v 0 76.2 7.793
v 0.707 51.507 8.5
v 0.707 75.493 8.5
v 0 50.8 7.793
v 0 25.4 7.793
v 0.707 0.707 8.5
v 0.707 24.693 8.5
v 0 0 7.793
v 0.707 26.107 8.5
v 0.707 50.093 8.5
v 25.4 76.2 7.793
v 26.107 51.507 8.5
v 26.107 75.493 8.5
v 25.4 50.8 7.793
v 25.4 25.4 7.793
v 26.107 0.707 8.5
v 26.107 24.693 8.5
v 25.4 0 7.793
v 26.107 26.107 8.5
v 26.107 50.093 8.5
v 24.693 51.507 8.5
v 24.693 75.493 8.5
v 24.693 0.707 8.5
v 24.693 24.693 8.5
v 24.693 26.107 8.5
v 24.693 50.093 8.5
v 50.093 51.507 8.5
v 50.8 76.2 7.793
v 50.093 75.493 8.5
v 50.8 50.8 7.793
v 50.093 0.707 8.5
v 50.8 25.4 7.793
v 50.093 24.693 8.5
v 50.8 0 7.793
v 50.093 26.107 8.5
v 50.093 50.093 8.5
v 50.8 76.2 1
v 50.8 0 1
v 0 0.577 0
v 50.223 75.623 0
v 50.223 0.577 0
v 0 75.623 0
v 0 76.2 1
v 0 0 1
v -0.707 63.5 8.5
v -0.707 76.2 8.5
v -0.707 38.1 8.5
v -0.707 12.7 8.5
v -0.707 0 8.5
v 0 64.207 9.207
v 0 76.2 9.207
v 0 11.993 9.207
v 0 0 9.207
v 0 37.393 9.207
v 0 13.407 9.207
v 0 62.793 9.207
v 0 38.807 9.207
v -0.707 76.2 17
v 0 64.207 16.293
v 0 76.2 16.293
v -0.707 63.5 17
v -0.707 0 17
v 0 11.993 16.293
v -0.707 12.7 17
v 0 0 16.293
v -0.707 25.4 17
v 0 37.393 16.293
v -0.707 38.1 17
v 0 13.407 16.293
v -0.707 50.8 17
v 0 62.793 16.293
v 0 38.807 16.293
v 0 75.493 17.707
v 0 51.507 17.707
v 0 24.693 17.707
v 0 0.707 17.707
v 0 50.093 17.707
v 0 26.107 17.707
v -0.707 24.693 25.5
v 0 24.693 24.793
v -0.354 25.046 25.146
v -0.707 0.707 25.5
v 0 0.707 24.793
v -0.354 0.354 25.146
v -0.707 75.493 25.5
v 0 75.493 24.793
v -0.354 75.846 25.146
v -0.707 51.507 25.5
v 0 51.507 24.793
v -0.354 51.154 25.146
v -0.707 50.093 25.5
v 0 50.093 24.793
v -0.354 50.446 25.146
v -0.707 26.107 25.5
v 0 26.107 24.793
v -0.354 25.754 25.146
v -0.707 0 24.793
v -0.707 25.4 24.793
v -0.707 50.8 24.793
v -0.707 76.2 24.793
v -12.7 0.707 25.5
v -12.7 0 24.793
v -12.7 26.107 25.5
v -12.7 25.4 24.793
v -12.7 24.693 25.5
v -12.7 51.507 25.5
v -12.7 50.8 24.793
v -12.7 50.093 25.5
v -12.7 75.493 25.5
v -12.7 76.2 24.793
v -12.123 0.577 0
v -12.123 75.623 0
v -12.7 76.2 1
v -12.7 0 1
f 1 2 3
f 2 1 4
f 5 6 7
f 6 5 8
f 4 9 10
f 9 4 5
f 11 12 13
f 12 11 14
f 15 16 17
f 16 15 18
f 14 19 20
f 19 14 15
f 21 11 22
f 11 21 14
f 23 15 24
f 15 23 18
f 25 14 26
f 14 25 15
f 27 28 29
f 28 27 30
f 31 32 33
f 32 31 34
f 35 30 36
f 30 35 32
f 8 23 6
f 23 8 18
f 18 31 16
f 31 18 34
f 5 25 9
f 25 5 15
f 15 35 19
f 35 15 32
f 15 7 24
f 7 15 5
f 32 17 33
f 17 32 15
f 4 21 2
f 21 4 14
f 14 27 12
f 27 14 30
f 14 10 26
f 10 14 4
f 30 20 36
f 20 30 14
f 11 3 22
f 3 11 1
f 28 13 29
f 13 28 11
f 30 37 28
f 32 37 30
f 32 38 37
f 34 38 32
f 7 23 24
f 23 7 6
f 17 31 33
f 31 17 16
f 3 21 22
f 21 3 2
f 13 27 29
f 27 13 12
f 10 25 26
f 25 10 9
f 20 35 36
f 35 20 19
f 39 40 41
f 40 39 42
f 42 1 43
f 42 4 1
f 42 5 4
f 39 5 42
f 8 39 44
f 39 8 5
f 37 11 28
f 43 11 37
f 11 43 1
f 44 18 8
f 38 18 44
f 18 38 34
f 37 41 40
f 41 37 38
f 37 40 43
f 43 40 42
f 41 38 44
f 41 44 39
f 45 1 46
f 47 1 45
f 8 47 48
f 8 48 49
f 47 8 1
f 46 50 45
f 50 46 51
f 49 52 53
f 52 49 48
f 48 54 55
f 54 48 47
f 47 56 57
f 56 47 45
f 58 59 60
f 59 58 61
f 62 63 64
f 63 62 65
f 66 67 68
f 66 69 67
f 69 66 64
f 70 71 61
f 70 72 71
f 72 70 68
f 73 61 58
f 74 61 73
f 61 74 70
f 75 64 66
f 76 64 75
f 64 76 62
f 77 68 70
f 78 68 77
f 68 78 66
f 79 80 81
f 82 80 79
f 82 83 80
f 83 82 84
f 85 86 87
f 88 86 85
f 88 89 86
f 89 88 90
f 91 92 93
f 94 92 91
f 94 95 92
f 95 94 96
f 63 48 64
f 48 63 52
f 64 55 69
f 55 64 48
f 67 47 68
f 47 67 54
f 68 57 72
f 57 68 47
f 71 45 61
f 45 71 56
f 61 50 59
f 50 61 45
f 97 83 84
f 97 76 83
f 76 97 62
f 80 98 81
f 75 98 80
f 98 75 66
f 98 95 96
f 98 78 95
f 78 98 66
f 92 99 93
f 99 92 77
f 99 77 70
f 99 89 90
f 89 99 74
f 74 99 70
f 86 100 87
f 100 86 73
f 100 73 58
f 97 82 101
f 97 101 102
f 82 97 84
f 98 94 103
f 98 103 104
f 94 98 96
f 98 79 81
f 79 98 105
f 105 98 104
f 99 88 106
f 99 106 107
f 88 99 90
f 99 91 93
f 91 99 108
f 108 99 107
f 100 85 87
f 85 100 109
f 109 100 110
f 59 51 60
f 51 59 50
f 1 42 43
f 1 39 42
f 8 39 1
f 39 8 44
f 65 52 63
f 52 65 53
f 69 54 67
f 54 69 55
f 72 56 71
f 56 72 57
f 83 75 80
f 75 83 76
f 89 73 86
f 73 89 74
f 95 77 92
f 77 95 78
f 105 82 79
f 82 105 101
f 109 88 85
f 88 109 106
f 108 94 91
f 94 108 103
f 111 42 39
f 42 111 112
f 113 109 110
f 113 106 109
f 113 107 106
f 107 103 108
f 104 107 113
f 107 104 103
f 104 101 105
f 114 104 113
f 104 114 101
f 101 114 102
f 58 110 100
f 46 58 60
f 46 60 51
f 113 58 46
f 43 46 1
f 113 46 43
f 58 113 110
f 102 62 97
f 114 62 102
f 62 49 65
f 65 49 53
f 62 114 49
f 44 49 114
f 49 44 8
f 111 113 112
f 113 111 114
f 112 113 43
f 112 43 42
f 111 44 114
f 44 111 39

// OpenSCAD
thickness=8.5;
tilex=2;
tiley=3;
inch=25.4;
groove=1;

//floor
difference()
{
    
    translate([tilex*inch/2,tiley*inch/2,thickness/2])cube([tilex*inch,tiley*inch,thickness],center=true);
    pocks=floor(rands(0,(tilex*tiley)*.75,1)[0]);
    echo (pocks);
    for (ii=[0:pocks])
    {
        shapenum = floor(rands(0,16,1)[0])+1;
        angle=floor(rands(0,360,1)[0])+1;
        xx=inch*(rands(0,tilex,1)[0])+inch/2;
        yy=inch*(rands(0,tiley,1)[0])+inch/2;
        translate([xx,yy,0])rotate([0,0,angle])translate([0,0,thickness])blemish(shapenum);
    }
    for (ii=[0:tilex])
    {
        translate([ii*inch,tiley*inch/2,thickness])rotate([0,45,0])cube([groove,tiley*inch*2,groove],center=true);
    }
    for (ii=[0:tiley])
    {
        translate([tilex*inch/2,ii*inch,thickness])rotate([45,0,0])cube([tilex*inch*2,groove,groove],center=true);
    }
    translate([tilex*inch,tiley*inch/2,0])rotate([0,30,0])cube([groove,tiley*inch*2,groove*2],center=true);
    //translate([0,tiley*inch/2,0])rotate([0,60,0])cube([groove*2,tiley*inch*2,groove],center=true);
    translate([tilex*inch/2,tiley*inch,0])rotate([60,0,0])cube([tilex*inch*2,groove*2,groove],center=true);
    translate([tilex*inch/2,0,0])rotate([30,0,0])cube([tilex*inch*2,groove,groove*2],center=true);
}
//wall
translate([-inch/2,0,0])
difference()
{
    translate([inch/4,tiley*inch/2,thickness*1.5])cube([inch/2,tiley*inch,thickness*3],center=true);
    
    pocks=floor(rands(0,(tiley)*.75,1)[0]);
    //pocks=0;
    //echo (pocks);
    for (ii=[0:pocks])
    {
        shapenum = floor(rands(0,16,1)[0])+1;
        echo(shapenum);
        angle=floor(rands(0,360,1)[0])+1;
        xx=((thickness*2+inch/2))*(rands(0,1,1)[0]); //total area is the top (inch/2) and the wall (2 thicknesses)
        yy=inch*(rands(0,tiley,1)[0]);
        zz=(inch/2+thickness*3)-xx;  //pivot is going to be the total area, minus how far we've gone so far (xx)
        
        translate([xx,yy,thickness*3])rotate([0,0,angle])blemish(shapenum);
        translate([inch/2,yy,zz])rotate([0,90,0])rotate([0,0,angle])blemish(shapenum);
    }
    for (ii=[0:2])
    {
        translate([inch/2,tiley*inch/2,thickness*1+(ii*thickness)])rotate([0,45,0])cube([groove,tiley*inch*2,groove],center=true);
    }
    for (ii=[0:tiley])
    {
        translate([inch/2,inch*ii+inch/2,thickness+thickness*.5])rotate([0,0,45])cube([groove,groove,thickness],center=true);
    }
    for (ii=[0:tiley])
    {
        translate([inch/2,inch*ii,thickness*2+thickness*.5])rotate([0,0,45])cube([groove,groove,thickness],center=true);
    }
    for (ii=[0:tiley])
    {
        translate([inch/4,inch*ii,thickness*3])rotate([45,0,0])cube([inch,groove,groove],center=true);
    }

    translate([tilex*inch,tiley*inch/2,0])rotate([0,30,0])cube([groove,tiley*inch*2,groove*2],center=true);
    translate([0,tiley*inch/2,0])rotate([0,60,0])cube([groove*2,tiley*inch*2,groove],center=true);
    translate([tilex*inch/2,tiley*inch,0])rotate([60,0,0])cube([tilex*inch*2,groove*2,groove],center=true);
    translate([tilex*inch/2,0,0])rotate([30,0,0])cube([tilex*inch*2,groove,groove*2],center=true);
    
}

module selectshape(shapenum)
{
    
    if (shapenum==1){ shape01(); }
    if (shapenum==2){ shape02(); }
    if (shapenum==3){ shape03(); }
    if (shapenum==4){ shape04(); }
    if (shapenum==5){ shape05(); }
    if (shapenum==6){ shape06(); }
    if (shapenum==7){ shape07(); }
    if (shapenum==8){ shape08(); }
    if (shapenum==9){ shape09(); }
    if (shapenum==10){ shape10(); }
    if (shapenum==11){ shape11(); }
    if (shapenum==12){ shape12(); }
    if (shapenum==13){ shape13(); }
    if (shapenum==14){ shape14(); }
    if (shapenum==15){ shape15(); }
    if (shapenum==16){ shape16(); }
}
module blemish(shapenum)
{
    
    {
        translate([0,0,-.5])linear_extrude(height=.101)selectshape(shapenum);
        translate([0,0,-.4])linear_extrude(height=.101)minkowski(){selectshape(shapenum); circle(r=.1);}
        translate([0,0,-.3])linear_extrude(height=.101)minkowski(){selectshape(shapenum); circle(r=.2);}
        translate([0,0,-.2])linear_extrude(height=.101)minkowski(){selectshape(shapenum); circle(r=.3);}
        translate([0,0,-.1])linear_extrude(height=.101)minkowski(){selectshape(shapenum); circle(r=.4);}
    }
}
module shape01()
{
    translate([-3,-2])scale(.8)import("blemish/shape001.dxf");
}
module shape02()
{
    translate([-3,-2])scale(.8)import("blemish/shape002.dxf");
}
module shape03()
{
    translate([-3,-2,0])scale(.8)import("blemish/shape003.dxf");
}
module shape04()
{
    translate([-14,-18,0])scale(.8)import("blemish/shape004.dxf");
}
module shape05()
{
    translate([-13,-10,0])scale(.8)import("blemish/shape005.dxf");
}
module shape06()
{
    translate([-2,-4,0])scale(.32)import("blemish/shape006.dxf");
}
module shape07()
{
    translate([-9,-9,0])scale(.3)import("blemish/shape007.dxf");
}
module shape08()
{
    translate([-6,-12,0])scale(.6)import("blemish/shape008.dxf");
}
module shape09()
{
    translate([-2,-2,0])scale(.2)import("blemish/shape009.dxf");
}
module shape10()
{
    translate([-1,-3,0])scale(.1)import("blemish/shape010.dxf");
}
module shape11()
{
    translate([-2,-4,0])scale(.3)import("blemish/shape011.dxf");
}
module shape12()
{
    translate([-6,-2,0])scale(.6)import("blemish/shape012.dxf");
}
module shape13()
{
    translate([-9,-14,0])scale(.7)import("blemish/shape013.dxf");
}
module shape14()
{
    translate([-0.5,-1,0])scale(.1)import("blemish/shape014.dxf");
}
module shape15()
{
    translate([-.5,-.5,0])scale(.1)import("blemish/shape015.dxf");
}
module shape16()
{
    translate([-6,-6,0])scale(.5)import("blemish/shape016.dxf");
}
